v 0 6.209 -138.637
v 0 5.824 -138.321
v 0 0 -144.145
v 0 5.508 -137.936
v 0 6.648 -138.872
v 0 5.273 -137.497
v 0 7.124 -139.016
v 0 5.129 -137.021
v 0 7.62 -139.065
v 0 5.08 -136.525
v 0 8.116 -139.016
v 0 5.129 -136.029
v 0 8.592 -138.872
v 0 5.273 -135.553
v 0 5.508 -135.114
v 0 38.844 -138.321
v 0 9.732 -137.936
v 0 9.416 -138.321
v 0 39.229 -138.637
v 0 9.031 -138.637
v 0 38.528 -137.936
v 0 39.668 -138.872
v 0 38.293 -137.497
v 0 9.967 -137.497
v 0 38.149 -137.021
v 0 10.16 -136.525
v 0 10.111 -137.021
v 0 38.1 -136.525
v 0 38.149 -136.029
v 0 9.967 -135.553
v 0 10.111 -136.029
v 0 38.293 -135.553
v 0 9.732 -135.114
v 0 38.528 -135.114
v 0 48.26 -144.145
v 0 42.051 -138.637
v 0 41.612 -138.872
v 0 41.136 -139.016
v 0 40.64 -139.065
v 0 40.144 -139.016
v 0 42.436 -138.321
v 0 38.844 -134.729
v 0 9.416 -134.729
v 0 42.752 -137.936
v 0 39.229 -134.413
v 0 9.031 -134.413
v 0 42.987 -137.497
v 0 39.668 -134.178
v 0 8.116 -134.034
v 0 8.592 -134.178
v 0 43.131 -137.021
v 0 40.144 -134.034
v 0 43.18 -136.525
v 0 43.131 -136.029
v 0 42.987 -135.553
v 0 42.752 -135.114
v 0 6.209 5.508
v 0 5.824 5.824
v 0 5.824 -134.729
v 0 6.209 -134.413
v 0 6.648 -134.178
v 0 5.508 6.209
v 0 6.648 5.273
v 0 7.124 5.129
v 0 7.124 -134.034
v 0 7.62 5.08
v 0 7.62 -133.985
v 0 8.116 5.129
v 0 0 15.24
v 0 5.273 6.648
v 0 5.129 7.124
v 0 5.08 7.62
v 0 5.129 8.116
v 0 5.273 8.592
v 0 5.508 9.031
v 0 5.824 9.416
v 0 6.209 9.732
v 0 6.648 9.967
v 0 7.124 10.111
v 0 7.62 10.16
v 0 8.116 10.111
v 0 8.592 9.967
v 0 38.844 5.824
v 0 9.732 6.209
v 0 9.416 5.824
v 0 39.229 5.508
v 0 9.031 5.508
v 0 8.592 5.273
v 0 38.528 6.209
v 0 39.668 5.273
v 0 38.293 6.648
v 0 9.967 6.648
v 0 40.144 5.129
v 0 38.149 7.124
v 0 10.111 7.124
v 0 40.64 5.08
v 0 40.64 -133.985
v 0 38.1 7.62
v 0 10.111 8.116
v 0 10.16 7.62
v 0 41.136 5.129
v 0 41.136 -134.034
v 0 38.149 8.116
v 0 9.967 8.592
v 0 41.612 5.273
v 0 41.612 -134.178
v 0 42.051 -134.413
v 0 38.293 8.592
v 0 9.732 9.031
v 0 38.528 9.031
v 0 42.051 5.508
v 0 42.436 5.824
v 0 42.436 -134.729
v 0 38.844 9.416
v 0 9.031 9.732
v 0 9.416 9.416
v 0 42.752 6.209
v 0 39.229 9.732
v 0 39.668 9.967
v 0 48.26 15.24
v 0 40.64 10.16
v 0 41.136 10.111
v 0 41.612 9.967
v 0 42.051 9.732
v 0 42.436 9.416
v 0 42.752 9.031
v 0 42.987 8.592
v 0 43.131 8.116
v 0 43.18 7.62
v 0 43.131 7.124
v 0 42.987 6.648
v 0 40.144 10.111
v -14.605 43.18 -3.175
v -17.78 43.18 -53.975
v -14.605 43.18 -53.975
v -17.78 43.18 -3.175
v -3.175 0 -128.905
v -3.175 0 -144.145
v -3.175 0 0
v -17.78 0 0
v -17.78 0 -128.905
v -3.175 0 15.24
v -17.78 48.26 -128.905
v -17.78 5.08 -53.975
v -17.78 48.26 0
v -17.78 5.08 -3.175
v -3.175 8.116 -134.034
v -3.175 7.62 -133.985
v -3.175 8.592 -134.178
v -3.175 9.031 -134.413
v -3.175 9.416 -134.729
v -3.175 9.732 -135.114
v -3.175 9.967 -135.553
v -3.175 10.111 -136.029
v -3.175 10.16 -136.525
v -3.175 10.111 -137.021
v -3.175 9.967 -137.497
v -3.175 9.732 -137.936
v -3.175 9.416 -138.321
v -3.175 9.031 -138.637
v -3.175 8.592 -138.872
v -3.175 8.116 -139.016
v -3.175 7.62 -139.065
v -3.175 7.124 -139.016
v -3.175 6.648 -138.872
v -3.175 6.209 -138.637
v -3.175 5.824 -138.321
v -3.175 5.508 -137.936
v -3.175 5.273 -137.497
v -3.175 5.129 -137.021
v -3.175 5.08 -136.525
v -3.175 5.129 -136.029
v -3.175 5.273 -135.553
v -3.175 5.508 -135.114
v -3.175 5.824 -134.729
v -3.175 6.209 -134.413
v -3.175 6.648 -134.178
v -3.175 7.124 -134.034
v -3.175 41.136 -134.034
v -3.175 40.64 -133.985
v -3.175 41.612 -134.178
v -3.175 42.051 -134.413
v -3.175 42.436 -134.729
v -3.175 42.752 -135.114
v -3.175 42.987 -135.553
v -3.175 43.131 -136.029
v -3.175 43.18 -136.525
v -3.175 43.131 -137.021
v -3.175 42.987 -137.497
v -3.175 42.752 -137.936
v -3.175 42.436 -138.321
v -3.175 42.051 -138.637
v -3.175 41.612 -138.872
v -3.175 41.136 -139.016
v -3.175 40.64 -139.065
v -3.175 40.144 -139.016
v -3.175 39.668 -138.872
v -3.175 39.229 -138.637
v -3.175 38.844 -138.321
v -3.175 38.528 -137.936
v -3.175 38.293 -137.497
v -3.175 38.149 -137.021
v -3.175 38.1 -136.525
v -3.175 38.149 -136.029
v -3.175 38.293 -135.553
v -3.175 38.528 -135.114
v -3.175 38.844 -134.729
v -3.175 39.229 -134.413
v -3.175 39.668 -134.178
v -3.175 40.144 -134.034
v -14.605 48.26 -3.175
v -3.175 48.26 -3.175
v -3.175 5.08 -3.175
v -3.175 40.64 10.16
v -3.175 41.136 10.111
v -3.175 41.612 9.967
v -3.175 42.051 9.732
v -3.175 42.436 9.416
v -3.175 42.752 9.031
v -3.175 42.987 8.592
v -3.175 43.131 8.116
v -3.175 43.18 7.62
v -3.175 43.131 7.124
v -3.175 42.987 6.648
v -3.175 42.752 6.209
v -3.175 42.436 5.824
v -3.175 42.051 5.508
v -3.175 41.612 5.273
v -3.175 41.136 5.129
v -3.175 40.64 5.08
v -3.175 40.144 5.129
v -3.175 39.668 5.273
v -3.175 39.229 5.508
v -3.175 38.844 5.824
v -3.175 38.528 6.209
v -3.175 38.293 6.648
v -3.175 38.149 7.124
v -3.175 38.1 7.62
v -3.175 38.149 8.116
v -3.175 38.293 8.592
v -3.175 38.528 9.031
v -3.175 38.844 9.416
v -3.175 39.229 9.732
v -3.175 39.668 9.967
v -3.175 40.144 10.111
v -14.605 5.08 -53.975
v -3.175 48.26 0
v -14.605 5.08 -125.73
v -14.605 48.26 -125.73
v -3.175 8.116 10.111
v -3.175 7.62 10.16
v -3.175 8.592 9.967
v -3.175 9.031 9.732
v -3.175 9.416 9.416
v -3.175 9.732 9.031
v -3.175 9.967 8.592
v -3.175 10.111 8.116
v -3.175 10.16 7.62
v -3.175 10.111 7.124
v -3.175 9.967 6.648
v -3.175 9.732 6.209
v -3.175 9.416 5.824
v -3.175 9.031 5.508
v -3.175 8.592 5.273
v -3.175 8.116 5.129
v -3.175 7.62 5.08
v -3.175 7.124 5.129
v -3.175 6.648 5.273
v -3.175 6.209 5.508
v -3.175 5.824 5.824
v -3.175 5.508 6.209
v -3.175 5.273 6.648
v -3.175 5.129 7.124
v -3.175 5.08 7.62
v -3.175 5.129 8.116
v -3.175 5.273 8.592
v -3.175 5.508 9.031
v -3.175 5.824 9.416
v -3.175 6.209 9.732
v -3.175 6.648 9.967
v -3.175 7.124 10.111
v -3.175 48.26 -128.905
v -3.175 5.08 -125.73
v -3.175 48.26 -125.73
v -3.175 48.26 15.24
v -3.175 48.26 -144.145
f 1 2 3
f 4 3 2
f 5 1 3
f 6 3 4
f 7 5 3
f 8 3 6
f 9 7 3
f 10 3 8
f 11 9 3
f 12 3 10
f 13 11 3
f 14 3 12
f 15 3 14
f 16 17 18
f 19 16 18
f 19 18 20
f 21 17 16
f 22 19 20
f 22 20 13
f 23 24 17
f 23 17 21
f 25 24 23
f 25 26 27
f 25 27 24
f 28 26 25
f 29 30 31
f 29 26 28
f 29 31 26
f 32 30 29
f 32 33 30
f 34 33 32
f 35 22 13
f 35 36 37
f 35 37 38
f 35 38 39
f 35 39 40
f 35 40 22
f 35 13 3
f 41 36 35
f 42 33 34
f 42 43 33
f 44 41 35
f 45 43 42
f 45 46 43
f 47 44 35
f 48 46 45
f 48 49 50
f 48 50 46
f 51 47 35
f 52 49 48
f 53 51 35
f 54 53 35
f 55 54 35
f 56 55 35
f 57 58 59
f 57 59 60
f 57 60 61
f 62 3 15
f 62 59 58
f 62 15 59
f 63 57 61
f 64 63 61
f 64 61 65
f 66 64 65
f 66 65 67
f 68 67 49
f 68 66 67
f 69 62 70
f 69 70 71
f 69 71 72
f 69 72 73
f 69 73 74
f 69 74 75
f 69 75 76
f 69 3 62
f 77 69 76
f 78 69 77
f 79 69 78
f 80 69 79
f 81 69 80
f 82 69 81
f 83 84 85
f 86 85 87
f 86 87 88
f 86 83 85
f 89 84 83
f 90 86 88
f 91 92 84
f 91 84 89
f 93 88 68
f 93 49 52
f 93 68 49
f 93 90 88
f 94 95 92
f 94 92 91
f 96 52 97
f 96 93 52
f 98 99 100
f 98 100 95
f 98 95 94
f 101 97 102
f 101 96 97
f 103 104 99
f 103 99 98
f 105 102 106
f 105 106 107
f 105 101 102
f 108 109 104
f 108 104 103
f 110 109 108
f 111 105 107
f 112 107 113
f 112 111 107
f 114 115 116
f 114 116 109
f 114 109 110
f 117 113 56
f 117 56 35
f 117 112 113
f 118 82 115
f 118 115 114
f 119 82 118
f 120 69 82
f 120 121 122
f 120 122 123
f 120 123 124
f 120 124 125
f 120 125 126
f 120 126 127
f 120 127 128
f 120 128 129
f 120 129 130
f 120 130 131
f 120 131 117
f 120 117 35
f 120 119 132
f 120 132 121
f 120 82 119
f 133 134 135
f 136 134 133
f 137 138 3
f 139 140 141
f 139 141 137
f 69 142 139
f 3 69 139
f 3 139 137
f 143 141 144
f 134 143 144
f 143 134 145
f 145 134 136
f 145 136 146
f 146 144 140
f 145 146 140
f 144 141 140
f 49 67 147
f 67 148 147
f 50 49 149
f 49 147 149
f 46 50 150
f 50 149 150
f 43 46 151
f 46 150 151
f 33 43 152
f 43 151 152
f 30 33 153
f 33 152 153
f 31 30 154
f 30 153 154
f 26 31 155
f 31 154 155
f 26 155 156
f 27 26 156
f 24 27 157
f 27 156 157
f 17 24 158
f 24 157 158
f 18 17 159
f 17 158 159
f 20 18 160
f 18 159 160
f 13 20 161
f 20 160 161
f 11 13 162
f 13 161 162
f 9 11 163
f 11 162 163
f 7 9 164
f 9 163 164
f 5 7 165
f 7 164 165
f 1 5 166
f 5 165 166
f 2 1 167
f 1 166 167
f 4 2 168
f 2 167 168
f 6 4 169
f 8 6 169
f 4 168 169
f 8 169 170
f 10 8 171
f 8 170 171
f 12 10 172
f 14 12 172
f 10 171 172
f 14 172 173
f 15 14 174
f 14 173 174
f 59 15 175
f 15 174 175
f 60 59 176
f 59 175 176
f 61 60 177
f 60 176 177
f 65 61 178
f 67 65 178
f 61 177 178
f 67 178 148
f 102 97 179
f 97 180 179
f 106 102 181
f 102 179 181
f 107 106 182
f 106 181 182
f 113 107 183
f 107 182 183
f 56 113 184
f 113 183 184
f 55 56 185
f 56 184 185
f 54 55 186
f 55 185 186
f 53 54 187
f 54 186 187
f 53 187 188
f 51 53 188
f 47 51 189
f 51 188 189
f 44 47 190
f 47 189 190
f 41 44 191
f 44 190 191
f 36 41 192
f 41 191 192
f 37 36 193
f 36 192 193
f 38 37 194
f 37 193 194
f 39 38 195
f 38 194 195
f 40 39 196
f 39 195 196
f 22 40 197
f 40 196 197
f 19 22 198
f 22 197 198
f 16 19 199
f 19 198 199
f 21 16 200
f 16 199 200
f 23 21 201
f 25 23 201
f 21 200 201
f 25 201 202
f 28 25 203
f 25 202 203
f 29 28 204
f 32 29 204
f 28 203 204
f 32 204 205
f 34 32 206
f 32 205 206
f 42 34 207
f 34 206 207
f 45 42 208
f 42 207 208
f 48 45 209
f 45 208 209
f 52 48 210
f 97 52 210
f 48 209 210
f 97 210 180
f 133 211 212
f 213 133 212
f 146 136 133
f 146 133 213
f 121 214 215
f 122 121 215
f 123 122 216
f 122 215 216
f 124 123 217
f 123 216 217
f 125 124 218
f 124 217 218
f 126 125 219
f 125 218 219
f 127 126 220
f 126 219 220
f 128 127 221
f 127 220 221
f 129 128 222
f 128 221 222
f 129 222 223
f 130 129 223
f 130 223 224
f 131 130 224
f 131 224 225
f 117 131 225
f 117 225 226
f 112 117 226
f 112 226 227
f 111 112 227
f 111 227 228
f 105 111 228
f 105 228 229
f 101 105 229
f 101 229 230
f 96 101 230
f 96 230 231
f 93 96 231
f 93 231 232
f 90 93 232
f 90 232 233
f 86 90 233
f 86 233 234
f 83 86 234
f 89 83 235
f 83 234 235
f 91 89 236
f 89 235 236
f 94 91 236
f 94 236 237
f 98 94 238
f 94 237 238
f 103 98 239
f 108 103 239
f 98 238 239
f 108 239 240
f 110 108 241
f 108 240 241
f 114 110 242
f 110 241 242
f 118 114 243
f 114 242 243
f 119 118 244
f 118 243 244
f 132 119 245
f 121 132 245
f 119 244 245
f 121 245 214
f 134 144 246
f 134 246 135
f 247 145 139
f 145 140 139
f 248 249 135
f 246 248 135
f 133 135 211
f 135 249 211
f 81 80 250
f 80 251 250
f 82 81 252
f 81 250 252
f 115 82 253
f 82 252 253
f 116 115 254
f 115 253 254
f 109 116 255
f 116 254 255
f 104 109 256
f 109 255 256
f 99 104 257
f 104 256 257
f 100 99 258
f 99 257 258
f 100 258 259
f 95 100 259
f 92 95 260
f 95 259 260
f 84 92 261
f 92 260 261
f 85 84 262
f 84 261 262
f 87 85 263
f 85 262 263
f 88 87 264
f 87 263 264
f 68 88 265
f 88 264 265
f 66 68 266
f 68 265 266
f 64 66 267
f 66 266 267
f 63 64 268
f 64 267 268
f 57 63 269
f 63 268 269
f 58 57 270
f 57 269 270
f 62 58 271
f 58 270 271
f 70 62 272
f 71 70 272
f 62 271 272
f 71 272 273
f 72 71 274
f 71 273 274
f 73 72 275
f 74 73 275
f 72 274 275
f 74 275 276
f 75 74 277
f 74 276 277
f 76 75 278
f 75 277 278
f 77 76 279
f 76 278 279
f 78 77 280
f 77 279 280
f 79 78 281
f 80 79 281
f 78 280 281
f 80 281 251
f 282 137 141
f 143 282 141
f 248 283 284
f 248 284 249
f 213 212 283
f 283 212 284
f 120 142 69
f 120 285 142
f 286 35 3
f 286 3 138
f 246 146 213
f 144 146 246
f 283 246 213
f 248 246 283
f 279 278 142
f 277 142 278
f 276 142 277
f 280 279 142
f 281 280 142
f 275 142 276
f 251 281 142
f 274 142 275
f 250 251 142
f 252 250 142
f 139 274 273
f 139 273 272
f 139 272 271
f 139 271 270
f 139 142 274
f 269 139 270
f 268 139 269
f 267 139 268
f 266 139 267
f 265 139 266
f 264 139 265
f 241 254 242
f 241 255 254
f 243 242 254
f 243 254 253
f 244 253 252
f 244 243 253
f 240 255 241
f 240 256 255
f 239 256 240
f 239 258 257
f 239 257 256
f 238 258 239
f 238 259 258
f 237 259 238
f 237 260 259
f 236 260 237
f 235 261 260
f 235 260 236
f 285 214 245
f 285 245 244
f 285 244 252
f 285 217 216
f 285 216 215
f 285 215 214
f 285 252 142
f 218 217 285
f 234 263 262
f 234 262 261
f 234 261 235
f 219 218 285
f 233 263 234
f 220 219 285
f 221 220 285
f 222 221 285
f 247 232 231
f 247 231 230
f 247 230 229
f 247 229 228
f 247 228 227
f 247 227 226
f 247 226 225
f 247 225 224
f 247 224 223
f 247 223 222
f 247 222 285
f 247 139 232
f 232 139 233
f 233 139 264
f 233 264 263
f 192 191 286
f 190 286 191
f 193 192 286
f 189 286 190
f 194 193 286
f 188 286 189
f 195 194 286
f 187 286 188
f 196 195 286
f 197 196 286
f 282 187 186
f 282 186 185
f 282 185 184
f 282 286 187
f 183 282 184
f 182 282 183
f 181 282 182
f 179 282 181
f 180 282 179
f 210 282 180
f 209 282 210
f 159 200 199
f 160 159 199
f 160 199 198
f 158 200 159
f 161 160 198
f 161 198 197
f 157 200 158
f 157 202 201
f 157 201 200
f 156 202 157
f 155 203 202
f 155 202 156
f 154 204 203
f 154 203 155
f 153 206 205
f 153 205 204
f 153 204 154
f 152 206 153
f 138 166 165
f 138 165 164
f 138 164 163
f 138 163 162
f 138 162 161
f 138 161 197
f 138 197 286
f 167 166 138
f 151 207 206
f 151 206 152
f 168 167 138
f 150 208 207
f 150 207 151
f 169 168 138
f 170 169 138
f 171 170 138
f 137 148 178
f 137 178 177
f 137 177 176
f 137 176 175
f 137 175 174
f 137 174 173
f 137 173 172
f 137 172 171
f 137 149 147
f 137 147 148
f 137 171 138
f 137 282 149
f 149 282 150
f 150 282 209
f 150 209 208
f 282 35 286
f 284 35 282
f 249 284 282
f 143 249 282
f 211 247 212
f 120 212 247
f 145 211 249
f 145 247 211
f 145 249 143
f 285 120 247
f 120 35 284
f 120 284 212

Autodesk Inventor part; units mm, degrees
ref_plane "YZ Plane" through (0, 0, 0) normal (1, 0, 0) x (0, 1, 0)
ref_plane "XZ Plane" through (0, 0, 0) normal (0, 1, 0) x (-1, 0, 0)
ref_plane "XY Plane" through (0, 0, 0) normal (0, 0, 1) x (1, 0, 0)
sketch "Sketch1" plane through (0, 0, 0) normal (0, 1, 0) x (-1, 0, 0)
  line L0 (0, 0) -> (0, -128.905)
  line L1 (0, -128.905) -> (17.78, -128.905)
  line L2 (17.78, -128.905) -> (17.78, 0)
  line L3 (17.78, 0) -> (0, 0)
  dimension "d0" = 128.905
  dimension "d1" = 17.78
extrude "Extrusion1" add sketch "Sketch1" along normal blind 48.26
sketch "Sketch2" plane through (0, 48.26, 0) normal (0, 1, 0) x (1, 0, 0)
  line L0 (0, 0) -> (0, 3.175)
  line L1 (0, 0) -> (0, 128.905) projected
  line L2 (0, 3.175) -> (-3.175, 3.175)
  line L3 (-3.175, 3.175) -> (-3.175, 125.73)
  line L4 (-3.175, 125.73) -> (-14.605, 125.73)
  line L5 (-14.605, 125.73) -> (-14.605, 3.175)
  line L6 (-14.605, 3.175) -> (-3.175, 3.175)
  dimension "d4" = 3.175
  dimension "d5" = 3.175
  dimension "d6" = 122.555
  dimension "d7" = 11.43
extrude "Extrusion2" cut sketch "Sketch2" against normal blind 43.18
sketch "Sketch3" plane through (-17.78, 0, -128.905) normal (-1, 0, 0) x (0, 0, 1)
  line L0 (128.905, 0) -> (125.73, 0)
  line L1 (128.905, 0) -> (0, 0) projected
  line L2 (125.73, 0) -> (125.73, 5.08)
  line L3 (125.73, 5.08) -> (74.93, 5.08)
  line L4 (3.175, 5.08) -> (125.73, 5.08) projected
  line L5 (74.93, 5.08) -> (74.93, 43.18)
  line L6 (0, 48.26) -> (128.905, 48.26) projected
  line L7 (74.93, 43.18) -> (125.73, 43.18)
  line L8 (125.73, 48.26) -> (125.73, 5.08) projected
  dimension "d10" = 3.175
  dimension "d11" = 5.08
  dimension "d12" = 50.8
  dimension "d13" = 38.1
extrude "Extrusion3" cut sketch "Sketch3" against normal blind 5.08
sketch "Sketch4" plane through (-17.78, 0, 0) normal (0, 0, 1) x (1, 0, 0)
  line L0 (17.78, 0) -> (14.605, 0)
  line L1 (0, 0) -> (17.78, 0) projected
  line L2 (14.605, 0) -> (14.605, 48.26)
  line L3 (17.78, 48.26) -> (0, 48.26) projected
  line L4 (17.78, 48.26) -> (17.78, 0)
  line L5 (17.78, 0) -> (17.78, 48.26) projected
  dimension "d16" = 3.175
extrude "Extrusion4" add sketch "Sketch4" along normal blind 15.24
sketch "Sketch5" plane through (-3.175, 0, 0) normal (-1, 0, 0) x (0, 0, 1)
  line L0 (15.24, 48.26) -> (7.62, 48.26)
  line L1 (0, 48.26) -> (15.24, 48.26) projected
  line L2 (7.62, 48.26) -> (7.62, 40.64)
  circle A0 centre (7.62, 40.64) radius 2.54
  line L3 (15.24, 0) -> (7.62, 0)
  line L4 (0, 0) -> (15.24, 0) projected
  line L5 (7.62, 0) -> (7.62, 7.62)
  circle A1 centre (7.62, 7.62) radius 2.54
  dimension "d19" = 7.62
  dimension "d20" = 7.62
  dimension "d21" = 5.08
  dimension "d22" = 7.62
  dimension "d23" = 7.62
  dimension "d24" = 5.08
extrude "Extrusion5" cut sketch "Sketch5" against normal blind 15.24
sketch "Sketch6" plane through (0, 0, -128.905) normal (0, 0, -1) x (-1, 0, 0)
  line L0 (0, 48.26) -> (3.175, 48.26)
  line L1 (3.175, 48.26) -> (3.175, 0)
  line L2 (3.175, 48.26) -> (3.175, 0) projected
  line L3 (3.175, 0) -> (0, 0)
  line L4 (0, 0) -> (0, 48.26)
  line L5 (0, 0) -> (0, 48.26) projected
  dimension "d27" = 3.175
extrude "Extrusion6" add sketch "Sketch6" along normal blind 15.24
sketch "Sketch7" plane through (-3.175, 0, -128.905) normal (-1, 0, 0) x (0, 0, 1)
  line L0 (-15.24, 48.26) -> (-15.24, 40.64)
  line L1 (-15.24, 48.26) -> (-15.24, 0) projected
  line L2 (-15.24, 40.64) -> (-7.62, 40.64)
  line L3 (-15.24, 0) -> (-7.62, 0)
  line L4 (0, 0) -> (-15.24, 0) projected
  line L5 (-7.62, 0) -> (-7.62, 7.62)
  circle A0 centre (-7.62, 7.62) radius 2.54
  circle A1 centre (-7.62, 40.64) radius 2.54
  point P0 (128.905, 0)
  dimension "d30" = 7.62
  dimension "d31" = 7.62
  dimension "d32" = 7.62
  dimension "d33" = 7.62
  dimension "d34" = 5.08
  dimension "d35" = 5.08
extrude "Extrusion7" cut sketch "Sketch7" against normal blind 15.24
properties part number "Autonomous - Phone Case V2"
